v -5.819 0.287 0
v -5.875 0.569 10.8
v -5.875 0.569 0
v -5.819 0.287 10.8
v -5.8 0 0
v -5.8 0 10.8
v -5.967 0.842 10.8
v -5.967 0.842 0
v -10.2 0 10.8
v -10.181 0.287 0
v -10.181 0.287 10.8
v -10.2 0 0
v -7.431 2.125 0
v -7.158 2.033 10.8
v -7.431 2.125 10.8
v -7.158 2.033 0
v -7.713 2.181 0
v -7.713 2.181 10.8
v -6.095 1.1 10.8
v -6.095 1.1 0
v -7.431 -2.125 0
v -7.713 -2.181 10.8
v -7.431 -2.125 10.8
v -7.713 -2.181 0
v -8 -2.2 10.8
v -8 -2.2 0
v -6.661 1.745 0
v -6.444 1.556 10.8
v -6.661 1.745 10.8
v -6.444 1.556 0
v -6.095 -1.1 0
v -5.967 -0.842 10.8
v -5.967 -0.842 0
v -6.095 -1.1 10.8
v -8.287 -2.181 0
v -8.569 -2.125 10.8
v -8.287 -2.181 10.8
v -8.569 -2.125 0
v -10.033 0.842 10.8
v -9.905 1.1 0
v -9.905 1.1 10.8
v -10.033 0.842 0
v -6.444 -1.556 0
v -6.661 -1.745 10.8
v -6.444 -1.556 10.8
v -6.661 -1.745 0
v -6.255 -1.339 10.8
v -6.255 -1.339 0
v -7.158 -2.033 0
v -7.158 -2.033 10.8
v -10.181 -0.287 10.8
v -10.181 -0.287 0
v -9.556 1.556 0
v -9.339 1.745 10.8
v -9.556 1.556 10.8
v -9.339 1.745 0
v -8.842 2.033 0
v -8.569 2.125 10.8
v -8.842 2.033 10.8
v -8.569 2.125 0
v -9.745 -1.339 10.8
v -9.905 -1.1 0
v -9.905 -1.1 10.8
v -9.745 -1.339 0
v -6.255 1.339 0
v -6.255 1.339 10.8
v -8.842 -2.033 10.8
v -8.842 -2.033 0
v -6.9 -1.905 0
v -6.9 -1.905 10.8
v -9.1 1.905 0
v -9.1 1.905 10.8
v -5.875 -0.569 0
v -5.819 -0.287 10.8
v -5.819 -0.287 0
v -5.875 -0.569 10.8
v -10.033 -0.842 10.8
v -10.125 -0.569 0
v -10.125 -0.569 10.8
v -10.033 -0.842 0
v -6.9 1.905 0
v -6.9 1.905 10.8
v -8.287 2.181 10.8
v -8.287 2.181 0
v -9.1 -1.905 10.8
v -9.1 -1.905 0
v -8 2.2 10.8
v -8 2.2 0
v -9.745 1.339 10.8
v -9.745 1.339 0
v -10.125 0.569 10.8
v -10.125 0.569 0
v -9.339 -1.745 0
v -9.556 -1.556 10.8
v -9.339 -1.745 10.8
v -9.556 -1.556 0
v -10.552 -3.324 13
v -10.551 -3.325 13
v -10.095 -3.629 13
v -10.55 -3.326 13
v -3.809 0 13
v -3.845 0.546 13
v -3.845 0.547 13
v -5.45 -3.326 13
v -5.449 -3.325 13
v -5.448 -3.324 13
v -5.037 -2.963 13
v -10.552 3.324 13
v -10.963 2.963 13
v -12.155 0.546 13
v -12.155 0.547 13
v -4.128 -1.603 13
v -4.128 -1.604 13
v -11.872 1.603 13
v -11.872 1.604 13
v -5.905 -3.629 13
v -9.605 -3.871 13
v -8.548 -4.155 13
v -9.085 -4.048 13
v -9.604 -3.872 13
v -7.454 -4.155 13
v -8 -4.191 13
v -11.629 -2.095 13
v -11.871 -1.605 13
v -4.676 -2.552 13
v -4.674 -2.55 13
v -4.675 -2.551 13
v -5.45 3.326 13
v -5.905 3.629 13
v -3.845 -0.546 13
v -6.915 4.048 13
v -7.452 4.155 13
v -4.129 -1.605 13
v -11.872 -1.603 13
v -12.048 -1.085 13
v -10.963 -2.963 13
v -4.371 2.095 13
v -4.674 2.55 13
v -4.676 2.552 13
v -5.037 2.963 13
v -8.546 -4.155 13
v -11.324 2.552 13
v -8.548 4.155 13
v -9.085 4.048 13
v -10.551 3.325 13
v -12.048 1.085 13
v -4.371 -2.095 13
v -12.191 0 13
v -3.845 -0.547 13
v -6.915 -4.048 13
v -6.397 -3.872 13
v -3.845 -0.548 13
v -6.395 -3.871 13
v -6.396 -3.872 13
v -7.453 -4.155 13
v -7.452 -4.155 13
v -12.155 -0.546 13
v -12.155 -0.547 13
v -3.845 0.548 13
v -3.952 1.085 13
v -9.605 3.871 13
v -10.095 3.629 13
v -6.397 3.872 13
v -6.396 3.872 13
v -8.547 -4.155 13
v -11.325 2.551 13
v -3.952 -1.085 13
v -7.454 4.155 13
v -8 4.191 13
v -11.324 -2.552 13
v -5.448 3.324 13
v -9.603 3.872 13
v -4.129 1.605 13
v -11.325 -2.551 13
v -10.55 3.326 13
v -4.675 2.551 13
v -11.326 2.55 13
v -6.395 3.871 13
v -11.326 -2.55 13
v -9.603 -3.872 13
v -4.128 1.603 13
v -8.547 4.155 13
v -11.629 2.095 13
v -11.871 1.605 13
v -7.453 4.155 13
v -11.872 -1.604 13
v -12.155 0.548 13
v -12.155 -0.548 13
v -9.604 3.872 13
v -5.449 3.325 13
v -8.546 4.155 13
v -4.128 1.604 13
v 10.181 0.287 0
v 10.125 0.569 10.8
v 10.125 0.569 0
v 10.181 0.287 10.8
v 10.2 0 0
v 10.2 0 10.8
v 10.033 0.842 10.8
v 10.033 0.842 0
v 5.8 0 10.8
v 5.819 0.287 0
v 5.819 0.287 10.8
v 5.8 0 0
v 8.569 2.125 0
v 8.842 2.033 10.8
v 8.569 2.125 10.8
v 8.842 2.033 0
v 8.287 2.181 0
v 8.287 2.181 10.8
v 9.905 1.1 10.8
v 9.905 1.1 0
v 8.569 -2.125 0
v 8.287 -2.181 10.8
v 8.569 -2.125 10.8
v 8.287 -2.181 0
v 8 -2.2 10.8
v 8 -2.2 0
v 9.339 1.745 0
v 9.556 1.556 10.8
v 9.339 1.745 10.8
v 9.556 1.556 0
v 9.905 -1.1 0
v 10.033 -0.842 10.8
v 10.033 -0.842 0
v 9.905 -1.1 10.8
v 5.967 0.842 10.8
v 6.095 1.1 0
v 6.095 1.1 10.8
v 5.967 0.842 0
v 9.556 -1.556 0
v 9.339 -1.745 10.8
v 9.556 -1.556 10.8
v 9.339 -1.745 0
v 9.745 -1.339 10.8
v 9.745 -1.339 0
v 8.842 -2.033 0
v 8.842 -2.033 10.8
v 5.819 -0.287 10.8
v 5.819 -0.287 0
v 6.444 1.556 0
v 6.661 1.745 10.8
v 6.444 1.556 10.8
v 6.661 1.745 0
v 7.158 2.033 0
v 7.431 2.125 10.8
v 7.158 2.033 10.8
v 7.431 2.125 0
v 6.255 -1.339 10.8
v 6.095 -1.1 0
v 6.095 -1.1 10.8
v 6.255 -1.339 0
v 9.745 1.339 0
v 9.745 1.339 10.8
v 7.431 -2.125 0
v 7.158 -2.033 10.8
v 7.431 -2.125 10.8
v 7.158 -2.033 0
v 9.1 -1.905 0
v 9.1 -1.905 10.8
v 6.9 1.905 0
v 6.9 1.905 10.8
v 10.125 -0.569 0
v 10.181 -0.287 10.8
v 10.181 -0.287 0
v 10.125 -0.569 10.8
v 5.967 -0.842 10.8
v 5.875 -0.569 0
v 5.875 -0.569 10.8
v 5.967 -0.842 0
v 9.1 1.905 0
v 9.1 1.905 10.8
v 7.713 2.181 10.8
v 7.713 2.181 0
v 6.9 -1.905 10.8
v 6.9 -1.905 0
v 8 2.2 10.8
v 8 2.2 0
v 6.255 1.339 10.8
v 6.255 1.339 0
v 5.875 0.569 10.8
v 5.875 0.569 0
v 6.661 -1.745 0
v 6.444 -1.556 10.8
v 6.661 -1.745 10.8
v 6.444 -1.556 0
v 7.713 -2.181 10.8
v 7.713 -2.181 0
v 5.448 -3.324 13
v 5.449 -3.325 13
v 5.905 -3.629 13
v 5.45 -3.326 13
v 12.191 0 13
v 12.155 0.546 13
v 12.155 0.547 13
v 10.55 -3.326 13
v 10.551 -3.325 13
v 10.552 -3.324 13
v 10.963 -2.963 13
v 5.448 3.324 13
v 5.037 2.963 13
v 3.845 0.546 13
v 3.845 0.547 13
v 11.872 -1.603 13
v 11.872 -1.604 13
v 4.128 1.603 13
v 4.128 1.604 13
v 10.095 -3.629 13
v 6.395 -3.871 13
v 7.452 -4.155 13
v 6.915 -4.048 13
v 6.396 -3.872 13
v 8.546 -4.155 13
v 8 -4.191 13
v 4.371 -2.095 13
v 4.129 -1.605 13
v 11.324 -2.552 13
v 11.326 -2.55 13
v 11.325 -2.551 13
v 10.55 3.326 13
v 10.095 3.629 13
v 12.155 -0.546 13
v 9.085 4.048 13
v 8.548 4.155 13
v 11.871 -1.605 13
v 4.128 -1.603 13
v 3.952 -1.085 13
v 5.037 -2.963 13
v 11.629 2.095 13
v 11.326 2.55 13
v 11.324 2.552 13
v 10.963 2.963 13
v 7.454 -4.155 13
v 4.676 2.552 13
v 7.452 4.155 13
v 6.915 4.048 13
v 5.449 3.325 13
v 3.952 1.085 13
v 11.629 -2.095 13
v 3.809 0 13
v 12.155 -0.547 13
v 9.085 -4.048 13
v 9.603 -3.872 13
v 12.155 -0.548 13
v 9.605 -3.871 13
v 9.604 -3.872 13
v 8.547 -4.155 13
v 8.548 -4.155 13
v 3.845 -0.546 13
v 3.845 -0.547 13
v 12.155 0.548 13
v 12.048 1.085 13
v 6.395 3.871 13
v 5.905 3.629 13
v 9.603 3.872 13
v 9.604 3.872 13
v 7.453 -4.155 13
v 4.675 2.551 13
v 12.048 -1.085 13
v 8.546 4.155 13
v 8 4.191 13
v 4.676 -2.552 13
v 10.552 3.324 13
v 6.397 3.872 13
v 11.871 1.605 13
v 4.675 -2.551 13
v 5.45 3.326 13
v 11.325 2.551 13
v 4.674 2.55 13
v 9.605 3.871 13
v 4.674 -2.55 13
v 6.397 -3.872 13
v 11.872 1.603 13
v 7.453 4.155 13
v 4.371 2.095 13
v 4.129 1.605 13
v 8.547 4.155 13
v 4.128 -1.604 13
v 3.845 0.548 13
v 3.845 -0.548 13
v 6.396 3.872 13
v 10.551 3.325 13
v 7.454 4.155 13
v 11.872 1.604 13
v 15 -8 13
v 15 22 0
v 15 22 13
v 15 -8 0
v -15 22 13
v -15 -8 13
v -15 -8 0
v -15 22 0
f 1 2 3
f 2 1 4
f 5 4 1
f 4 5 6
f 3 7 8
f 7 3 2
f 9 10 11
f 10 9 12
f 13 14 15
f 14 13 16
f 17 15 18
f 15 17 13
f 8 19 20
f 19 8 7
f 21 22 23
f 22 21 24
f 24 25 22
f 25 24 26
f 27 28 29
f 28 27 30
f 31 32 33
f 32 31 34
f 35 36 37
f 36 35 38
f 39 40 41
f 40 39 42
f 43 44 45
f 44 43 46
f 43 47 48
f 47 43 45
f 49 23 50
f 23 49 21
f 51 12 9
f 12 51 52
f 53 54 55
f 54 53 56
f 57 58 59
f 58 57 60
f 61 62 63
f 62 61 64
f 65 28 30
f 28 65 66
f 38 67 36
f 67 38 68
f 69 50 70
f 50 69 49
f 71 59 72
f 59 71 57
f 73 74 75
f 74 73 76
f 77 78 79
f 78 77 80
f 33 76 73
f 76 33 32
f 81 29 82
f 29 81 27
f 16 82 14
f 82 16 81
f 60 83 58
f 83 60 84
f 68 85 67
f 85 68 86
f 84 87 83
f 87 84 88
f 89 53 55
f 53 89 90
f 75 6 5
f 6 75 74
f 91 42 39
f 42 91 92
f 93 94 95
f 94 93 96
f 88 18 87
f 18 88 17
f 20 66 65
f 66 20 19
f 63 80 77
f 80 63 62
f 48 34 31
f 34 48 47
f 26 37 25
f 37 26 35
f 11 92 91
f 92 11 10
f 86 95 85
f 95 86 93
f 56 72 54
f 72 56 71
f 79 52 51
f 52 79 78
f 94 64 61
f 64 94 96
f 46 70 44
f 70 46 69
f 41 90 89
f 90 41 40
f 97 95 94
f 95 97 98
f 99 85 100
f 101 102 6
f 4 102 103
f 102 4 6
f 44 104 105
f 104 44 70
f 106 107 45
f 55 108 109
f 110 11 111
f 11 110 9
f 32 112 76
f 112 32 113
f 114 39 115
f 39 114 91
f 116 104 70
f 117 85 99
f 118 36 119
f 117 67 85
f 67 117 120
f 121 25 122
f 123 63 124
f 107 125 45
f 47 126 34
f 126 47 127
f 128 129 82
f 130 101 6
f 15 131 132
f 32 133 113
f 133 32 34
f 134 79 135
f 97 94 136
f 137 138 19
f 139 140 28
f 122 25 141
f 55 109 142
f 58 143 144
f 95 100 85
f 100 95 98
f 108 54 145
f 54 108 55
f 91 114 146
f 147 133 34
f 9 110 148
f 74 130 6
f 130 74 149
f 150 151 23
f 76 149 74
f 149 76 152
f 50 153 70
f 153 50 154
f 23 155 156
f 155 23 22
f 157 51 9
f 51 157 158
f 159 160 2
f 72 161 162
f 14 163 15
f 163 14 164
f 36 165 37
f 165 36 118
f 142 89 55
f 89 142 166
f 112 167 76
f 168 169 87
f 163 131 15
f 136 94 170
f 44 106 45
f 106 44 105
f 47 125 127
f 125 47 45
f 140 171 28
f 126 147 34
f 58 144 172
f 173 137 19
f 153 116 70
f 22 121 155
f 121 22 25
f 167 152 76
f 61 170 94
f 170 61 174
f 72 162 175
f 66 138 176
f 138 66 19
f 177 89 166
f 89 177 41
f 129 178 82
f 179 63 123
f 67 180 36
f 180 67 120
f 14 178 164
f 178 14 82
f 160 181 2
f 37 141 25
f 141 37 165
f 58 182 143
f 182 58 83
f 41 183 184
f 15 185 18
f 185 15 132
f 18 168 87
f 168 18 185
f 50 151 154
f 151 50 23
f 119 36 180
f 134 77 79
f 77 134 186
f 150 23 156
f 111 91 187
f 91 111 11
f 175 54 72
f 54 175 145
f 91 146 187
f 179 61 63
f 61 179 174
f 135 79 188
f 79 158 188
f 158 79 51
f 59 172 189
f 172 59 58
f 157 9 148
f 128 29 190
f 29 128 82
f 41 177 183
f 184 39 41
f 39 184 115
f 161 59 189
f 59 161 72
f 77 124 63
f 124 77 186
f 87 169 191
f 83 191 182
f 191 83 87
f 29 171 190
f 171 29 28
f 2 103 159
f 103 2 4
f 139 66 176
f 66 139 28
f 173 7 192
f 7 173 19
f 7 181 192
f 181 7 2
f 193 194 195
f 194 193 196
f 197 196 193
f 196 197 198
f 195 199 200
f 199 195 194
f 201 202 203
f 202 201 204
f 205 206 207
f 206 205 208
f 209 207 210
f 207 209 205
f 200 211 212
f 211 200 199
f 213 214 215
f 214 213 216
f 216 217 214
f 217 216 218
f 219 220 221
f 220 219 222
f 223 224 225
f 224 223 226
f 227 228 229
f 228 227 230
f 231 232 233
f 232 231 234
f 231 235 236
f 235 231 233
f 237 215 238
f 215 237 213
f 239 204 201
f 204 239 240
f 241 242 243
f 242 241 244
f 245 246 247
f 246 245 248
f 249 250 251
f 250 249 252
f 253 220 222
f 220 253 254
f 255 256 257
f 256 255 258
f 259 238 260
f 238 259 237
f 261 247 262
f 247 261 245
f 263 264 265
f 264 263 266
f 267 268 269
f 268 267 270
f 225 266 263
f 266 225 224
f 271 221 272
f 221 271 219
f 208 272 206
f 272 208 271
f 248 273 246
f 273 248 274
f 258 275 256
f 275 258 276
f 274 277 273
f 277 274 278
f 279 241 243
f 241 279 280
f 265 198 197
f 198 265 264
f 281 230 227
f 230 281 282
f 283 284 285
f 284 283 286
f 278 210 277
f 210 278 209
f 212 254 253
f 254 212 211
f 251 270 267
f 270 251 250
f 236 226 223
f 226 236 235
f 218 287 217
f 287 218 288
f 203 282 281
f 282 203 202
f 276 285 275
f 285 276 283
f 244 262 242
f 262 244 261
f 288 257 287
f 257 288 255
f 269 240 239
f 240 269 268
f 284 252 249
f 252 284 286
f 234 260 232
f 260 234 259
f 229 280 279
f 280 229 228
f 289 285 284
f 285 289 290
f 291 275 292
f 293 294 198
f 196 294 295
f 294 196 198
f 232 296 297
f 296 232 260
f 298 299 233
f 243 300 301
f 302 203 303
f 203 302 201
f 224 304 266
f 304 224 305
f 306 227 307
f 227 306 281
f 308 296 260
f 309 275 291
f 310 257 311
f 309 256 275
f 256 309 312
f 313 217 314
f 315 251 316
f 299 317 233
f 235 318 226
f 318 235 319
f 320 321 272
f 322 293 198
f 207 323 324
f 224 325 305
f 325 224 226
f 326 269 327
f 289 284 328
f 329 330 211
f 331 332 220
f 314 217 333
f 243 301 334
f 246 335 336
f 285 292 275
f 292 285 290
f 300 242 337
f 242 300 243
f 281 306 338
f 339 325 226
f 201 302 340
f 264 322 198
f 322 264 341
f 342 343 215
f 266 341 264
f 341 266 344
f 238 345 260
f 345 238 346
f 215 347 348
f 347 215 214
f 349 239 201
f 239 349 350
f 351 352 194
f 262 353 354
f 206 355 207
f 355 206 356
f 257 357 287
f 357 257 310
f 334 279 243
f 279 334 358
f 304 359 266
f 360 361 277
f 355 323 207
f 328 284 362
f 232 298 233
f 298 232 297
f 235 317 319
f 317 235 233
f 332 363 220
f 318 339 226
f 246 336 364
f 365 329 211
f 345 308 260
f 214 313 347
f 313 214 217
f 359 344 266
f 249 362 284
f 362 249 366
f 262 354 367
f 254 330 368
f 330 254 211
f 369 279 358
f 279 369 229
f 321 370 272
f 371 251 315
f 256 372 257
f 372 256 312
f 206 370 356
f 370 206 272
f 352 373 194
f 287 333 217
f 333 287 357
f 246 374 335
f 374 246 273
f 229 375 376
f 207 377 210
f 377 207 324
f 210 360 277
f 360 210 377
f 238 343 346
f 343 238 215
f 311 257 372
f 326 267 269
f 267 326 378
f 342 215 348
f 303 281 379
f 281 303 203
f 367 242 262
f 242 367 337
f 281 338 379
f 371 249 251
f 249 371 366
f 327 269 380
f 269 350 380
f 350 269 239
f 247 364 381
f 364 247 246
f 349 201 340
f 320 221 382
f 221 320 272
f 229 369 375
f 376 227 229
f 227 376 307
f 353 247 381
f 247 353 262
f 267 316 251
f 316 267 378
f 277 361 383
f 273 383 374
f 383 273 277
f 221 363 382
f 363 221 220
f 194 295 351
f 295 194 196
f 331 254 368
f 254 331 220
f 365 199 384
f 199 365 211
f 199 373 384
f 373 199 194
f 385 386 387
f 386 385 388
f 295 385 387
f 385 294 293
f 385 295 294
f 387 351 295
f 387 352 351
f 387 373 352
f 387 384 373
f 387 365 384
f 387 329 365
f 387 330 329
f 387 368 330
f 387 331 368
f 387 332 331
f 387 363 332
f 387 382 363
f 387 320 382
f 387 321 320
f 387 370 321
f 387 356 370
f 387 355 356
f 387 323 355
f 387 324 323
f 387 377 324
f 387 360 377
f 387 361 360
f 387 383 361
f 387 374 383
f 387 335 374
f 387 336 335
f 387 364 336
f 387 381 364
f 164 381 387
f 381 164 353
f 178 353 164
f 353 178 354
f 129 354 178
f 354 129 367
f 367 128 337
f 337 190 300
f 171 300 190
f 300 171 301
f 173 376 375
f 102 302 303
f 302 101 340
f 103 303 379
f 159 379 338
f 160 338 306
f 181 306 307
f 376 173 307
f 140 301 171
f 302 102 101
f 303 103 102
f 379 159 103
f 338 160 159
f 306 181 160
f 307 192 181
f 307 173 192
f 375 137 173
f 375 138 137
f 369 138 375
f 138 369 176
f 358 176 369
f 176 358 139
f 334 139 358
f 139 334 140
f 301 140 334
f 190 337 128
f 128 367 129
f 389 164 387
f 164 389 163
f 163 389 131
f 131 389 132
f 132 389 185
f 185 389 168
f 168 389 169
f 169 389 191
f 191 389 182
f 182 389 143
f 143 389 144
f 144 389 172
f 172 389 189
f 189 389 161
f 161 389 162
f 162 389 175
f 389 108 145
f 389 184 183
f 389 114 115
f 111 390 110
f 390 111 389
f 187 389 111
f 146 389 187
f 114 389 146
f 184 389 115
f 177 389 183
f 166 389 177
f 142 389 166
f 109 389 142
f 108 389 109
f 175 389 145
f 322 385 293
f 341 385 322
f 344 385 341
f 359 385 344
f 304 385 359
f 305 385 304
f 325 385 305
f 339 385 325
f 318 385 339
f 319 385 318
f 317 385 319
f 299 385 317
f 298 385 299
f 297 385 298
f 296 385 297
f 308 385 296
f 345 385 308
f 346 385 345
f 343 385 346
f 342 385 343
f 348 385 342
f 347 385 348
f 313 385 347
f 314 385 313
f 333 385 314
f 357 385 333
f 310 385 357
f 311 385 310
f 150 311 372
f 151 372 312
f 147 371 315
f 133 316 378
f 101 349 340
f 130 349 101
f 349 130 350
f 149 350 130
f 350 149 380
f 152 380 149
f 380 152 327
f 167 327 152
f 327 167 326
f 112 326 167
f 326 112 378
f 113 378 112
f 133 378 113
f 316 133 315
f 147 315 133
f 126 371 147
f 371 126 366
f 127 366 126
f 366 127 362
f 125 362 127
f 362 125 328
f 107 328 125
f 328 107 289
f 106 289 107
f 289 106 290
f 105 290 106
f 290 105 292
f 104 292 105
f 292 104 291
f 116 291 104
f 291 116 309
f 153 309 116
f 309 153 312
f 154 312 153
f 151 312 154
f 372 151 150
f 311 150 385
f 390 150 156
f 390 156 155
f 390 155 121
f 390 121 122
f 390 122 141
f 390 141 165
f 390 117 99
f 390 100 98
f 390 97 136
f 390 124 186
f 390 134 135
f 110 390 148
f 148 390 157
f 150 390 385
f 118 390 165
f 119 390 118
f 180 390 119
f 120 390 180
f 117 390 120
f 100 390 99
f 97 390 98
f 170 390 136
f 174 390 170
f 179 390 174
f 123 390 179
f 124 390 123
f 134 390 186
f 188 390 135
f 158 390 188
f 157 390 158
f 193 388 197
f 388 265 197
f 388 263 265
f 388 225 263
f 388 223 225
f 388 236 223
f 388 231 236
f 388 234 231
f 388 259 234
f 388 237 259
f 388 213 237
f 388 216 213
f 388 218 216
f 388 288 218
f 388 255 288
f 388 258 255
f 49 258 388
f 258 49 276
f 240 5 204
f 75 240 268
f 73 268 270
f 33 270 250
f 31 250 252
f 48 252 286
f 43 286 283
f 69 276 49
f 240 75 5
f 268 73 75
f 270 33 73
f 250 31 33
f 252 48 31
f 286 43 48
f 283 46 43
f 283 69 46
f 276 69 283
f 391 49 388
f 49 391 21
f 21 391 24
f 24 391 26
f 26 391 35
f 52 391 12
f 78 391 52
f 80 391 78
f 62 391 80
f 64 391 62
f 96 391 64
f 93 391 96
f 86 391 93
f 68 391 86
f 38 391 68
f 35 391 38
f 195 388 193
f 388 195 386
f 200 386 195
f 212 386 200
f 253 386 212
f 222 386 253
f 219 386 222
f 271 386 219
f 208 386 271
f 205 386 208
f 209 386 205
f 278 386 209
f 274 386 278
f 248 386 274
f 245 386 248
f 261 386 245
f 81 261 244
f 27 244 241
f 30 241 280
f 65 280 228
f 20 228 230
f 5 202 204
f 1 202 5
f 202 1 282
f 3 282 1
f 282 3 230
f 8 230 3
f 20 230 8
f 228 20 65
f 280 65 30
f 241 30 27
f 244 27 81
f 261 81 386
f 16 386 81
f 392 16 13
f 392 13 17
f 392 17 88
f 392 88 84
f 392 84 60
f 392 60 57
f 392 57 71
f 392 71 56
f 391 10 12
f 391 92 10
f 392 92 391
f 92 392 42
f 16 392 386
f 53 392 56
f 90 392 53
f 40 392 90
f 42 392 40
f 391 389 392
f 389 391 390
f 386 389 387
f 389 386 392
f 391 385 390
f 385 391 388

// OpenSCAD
// Contre-piece (striker) du microswitch V-156 pour le bumper VECTOR
// - se visse dans la rainure centrale d'un profile alu 20 mm (rainure a 10 mm du bord)
// - le BOUT depasse de 12 mm du bord du profile => bout a 22 mm du CENTRE des trous
// - largeur 30 mm, deux trous sur l'axe de la rainure, t-nuts M4 (passage 4.4)
// Impression : TPU (metrox). Editable : toutes les cotes sont des parametres.

width        = 30;    // largeur, le long de la rainure [mm]
tip_from_hole = 22;   // centre des trous -> bout [mm] (10 sortie profile + 12 depassement)
tail         = 8;     // matiere derriere les trous [mm]
thickness    = 13;   // epaisseur [mm] (10 + 3 : vis un peu longues pour le TPU, metrox 24/08)
hole_d       = 4.4;   // passage vis M4
hole_spacing = 16;    // entraxe des deux trous, le long de la rainure [mm]
head_d       = 8.4;   // fraisage tete conique M4 (0 = pas de fraisage)
head_depth   = 2.2;
nose_chamfer = 0;    // AUCUN chanfrein : la languette du V-156 veut une face franche (metrox 24/08)

module striker() {
    difference() {
        // plaque : y=0 est l'axe des trous ; le bout est a y=+tip_from_hole
        translate([-width/2, -tail, 0])
            cube([width, tail + tip_from_hole, thickness]);
        // chanfrein du nez
        translate([-width/2 - 1, tip_from_hole - nose_chamfer, thickness])
            rotate([45, 0, 0])
            cube([width + 2, nose_chamfer * 2, nose_chamfer * 2]);
        // deux trous + fraisage
        for (x = [-hole_spacing/2, hole_spacing/2]) {
            translate([x, 0, -1]) cylinder(d = hole_d, h = thickness + 2, $fn = 48);
            if (head_d > 0)
                translate([x, 0, thickness - head_depth])
                    cylinder(d1 = hole_d, d2 = head_d, h = head_depth + 0.01, $fn = 48);
        }
    }
}
striker();
